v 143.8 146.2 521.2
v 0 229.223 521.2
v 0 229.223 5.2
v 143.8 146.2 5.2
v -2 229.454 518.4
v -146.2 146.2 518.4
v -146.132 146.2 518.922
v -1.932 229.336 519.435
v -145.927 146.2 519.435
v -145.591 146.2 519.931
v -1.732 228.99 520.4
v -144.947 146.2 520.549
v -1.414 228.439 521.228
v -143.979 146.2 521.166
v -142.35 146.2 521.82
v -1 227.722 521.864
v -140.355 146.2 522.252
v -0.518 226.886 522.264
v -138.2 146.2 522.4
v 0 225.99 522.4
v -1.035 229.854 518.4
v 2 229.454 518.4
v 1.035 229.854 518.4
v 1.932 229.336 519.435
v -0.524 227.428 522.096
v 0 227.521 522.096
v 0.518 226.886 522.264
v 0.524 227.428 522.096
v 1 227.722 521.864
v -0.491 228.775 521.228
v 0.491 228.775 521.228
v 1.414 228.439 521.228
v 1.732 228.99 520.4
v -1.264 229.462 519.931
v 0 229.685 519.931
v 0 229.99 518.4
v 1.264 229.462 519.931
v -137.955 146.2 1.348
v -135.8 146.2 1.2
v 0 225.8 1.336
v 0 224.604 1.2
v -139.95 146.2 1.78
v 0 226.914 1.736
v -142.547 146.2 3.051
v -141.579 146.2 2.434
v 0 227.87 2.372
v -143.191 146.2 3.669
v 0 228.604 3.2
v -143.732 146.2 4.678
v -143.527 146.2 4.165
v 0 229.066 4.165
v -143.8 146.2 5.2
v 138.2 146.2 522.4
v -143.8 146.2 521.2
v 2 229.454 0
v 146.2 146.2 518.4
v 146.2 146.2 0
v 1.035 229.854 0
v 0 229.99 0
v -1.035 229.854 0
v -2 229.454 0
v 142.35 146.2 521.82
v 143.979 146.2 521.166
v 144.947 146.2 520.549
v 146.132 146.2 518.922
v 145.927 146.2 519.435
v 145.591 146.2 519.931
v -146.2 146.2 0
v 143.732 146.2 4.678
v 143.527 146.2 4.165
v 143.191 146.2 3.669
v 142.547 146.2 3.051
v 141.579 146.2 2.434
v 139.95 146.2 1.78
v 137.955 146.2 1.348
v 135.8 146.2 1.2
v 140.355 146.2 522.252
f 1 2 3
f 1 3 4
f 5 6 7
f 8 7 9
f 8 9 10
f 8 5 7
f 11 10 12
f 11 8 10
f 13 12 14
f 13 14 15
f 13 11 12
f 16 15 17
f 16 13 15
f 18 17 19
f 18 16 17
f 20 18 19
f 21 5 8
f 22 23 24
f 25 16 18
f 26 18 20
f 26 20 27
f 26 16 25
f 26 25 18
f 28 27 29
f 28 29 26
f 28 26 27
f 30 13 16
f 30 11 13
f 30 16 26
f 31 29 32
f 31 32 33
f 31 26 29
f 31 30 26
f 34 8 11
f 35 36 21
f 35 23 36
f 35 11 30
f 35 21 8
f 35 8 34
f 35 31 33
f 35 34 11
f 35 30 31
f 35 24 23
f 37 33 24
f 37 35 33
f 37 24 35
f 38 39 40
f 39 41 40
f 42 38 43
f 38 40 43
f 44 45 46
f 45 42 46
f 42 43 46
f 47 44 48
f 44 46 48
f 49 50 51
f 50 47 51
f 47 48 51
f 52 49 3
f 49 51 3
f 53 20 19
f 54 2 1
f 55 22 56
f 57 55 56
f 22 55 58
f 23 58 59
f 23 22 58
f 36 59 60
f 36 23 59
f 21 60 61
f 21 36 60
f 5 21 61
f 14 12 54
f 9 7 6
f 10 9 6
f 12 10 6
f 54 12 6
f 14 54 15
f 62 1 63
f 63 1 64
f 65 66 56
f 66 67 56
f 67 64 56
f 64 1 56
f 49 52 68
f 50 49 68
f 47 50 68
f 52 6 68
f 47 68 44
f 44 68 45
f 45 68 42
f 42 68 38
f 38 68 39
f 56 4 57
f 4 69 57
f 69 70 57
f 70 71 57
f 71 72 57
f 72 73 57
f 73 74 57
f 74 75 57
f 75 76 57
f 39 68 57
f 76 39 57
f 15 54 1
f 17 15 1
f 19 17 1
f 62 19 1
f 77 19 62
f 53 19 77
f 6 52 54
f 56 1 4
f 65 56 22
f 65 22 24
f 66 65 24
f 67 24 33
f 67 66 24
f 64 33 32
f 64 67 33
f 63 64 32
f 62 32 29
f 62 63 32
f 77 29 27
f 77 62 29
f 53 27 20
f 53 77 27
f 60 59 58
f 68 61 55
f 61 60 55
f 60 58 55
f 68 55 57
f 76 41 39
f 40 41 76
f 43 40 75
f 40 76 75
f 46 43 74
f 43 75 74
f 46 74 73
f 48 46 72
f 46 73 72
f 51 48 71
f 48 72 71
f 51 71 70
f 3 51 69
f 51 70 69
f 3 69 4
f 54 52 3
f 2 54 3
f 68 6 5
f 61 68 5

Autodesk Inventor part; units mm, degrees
ref_plane "YZ Plane" through (0, 0, 0) normal (1, 0, 0) x (0, 1, 0)
ref_plane "XZ Plane" through (0, 0, 0) normal (0, 1, 0) x (-1, 0, 0)
ref_plane "XY Plane" through (0, 0, 0) normal (0, 0, 1) x (1, 0, 0)
sketch "Boceto1" plane through (0, 0, 0) normal (0, 0, 1) x (1, 0, 0)
  line L0 (-146.2, 146.2) -> (146.2, 146.2)
  line L1 (-146.2, 146.2) -> (0, 230.6086)
  line L2 (-146.2, 146.2) -> (32.5033, 146.2) construction
  line L3 (0, 230.6086) -> (146.2, 146.2)
  point P0 (0, 0)
  dimension "d2" = 30
extrude "Extrusión1" add sketch "Boceto1" along normal blind 522.4
shell "Vaciado1" thickness 1.2 removed faces 1 at (-48.7333, 146.2, 174.1333)
fillet "Empalme1" radius 4 5 edges at (0, 230.6086, 261.2) (-73.1, 188.4043, 522.4) (73.1, 188.4043, 522.4) (71.9, 187.7115, 1.2) (-71.9, 187.7115, 1.2)
properties part number "tapa_marco"
